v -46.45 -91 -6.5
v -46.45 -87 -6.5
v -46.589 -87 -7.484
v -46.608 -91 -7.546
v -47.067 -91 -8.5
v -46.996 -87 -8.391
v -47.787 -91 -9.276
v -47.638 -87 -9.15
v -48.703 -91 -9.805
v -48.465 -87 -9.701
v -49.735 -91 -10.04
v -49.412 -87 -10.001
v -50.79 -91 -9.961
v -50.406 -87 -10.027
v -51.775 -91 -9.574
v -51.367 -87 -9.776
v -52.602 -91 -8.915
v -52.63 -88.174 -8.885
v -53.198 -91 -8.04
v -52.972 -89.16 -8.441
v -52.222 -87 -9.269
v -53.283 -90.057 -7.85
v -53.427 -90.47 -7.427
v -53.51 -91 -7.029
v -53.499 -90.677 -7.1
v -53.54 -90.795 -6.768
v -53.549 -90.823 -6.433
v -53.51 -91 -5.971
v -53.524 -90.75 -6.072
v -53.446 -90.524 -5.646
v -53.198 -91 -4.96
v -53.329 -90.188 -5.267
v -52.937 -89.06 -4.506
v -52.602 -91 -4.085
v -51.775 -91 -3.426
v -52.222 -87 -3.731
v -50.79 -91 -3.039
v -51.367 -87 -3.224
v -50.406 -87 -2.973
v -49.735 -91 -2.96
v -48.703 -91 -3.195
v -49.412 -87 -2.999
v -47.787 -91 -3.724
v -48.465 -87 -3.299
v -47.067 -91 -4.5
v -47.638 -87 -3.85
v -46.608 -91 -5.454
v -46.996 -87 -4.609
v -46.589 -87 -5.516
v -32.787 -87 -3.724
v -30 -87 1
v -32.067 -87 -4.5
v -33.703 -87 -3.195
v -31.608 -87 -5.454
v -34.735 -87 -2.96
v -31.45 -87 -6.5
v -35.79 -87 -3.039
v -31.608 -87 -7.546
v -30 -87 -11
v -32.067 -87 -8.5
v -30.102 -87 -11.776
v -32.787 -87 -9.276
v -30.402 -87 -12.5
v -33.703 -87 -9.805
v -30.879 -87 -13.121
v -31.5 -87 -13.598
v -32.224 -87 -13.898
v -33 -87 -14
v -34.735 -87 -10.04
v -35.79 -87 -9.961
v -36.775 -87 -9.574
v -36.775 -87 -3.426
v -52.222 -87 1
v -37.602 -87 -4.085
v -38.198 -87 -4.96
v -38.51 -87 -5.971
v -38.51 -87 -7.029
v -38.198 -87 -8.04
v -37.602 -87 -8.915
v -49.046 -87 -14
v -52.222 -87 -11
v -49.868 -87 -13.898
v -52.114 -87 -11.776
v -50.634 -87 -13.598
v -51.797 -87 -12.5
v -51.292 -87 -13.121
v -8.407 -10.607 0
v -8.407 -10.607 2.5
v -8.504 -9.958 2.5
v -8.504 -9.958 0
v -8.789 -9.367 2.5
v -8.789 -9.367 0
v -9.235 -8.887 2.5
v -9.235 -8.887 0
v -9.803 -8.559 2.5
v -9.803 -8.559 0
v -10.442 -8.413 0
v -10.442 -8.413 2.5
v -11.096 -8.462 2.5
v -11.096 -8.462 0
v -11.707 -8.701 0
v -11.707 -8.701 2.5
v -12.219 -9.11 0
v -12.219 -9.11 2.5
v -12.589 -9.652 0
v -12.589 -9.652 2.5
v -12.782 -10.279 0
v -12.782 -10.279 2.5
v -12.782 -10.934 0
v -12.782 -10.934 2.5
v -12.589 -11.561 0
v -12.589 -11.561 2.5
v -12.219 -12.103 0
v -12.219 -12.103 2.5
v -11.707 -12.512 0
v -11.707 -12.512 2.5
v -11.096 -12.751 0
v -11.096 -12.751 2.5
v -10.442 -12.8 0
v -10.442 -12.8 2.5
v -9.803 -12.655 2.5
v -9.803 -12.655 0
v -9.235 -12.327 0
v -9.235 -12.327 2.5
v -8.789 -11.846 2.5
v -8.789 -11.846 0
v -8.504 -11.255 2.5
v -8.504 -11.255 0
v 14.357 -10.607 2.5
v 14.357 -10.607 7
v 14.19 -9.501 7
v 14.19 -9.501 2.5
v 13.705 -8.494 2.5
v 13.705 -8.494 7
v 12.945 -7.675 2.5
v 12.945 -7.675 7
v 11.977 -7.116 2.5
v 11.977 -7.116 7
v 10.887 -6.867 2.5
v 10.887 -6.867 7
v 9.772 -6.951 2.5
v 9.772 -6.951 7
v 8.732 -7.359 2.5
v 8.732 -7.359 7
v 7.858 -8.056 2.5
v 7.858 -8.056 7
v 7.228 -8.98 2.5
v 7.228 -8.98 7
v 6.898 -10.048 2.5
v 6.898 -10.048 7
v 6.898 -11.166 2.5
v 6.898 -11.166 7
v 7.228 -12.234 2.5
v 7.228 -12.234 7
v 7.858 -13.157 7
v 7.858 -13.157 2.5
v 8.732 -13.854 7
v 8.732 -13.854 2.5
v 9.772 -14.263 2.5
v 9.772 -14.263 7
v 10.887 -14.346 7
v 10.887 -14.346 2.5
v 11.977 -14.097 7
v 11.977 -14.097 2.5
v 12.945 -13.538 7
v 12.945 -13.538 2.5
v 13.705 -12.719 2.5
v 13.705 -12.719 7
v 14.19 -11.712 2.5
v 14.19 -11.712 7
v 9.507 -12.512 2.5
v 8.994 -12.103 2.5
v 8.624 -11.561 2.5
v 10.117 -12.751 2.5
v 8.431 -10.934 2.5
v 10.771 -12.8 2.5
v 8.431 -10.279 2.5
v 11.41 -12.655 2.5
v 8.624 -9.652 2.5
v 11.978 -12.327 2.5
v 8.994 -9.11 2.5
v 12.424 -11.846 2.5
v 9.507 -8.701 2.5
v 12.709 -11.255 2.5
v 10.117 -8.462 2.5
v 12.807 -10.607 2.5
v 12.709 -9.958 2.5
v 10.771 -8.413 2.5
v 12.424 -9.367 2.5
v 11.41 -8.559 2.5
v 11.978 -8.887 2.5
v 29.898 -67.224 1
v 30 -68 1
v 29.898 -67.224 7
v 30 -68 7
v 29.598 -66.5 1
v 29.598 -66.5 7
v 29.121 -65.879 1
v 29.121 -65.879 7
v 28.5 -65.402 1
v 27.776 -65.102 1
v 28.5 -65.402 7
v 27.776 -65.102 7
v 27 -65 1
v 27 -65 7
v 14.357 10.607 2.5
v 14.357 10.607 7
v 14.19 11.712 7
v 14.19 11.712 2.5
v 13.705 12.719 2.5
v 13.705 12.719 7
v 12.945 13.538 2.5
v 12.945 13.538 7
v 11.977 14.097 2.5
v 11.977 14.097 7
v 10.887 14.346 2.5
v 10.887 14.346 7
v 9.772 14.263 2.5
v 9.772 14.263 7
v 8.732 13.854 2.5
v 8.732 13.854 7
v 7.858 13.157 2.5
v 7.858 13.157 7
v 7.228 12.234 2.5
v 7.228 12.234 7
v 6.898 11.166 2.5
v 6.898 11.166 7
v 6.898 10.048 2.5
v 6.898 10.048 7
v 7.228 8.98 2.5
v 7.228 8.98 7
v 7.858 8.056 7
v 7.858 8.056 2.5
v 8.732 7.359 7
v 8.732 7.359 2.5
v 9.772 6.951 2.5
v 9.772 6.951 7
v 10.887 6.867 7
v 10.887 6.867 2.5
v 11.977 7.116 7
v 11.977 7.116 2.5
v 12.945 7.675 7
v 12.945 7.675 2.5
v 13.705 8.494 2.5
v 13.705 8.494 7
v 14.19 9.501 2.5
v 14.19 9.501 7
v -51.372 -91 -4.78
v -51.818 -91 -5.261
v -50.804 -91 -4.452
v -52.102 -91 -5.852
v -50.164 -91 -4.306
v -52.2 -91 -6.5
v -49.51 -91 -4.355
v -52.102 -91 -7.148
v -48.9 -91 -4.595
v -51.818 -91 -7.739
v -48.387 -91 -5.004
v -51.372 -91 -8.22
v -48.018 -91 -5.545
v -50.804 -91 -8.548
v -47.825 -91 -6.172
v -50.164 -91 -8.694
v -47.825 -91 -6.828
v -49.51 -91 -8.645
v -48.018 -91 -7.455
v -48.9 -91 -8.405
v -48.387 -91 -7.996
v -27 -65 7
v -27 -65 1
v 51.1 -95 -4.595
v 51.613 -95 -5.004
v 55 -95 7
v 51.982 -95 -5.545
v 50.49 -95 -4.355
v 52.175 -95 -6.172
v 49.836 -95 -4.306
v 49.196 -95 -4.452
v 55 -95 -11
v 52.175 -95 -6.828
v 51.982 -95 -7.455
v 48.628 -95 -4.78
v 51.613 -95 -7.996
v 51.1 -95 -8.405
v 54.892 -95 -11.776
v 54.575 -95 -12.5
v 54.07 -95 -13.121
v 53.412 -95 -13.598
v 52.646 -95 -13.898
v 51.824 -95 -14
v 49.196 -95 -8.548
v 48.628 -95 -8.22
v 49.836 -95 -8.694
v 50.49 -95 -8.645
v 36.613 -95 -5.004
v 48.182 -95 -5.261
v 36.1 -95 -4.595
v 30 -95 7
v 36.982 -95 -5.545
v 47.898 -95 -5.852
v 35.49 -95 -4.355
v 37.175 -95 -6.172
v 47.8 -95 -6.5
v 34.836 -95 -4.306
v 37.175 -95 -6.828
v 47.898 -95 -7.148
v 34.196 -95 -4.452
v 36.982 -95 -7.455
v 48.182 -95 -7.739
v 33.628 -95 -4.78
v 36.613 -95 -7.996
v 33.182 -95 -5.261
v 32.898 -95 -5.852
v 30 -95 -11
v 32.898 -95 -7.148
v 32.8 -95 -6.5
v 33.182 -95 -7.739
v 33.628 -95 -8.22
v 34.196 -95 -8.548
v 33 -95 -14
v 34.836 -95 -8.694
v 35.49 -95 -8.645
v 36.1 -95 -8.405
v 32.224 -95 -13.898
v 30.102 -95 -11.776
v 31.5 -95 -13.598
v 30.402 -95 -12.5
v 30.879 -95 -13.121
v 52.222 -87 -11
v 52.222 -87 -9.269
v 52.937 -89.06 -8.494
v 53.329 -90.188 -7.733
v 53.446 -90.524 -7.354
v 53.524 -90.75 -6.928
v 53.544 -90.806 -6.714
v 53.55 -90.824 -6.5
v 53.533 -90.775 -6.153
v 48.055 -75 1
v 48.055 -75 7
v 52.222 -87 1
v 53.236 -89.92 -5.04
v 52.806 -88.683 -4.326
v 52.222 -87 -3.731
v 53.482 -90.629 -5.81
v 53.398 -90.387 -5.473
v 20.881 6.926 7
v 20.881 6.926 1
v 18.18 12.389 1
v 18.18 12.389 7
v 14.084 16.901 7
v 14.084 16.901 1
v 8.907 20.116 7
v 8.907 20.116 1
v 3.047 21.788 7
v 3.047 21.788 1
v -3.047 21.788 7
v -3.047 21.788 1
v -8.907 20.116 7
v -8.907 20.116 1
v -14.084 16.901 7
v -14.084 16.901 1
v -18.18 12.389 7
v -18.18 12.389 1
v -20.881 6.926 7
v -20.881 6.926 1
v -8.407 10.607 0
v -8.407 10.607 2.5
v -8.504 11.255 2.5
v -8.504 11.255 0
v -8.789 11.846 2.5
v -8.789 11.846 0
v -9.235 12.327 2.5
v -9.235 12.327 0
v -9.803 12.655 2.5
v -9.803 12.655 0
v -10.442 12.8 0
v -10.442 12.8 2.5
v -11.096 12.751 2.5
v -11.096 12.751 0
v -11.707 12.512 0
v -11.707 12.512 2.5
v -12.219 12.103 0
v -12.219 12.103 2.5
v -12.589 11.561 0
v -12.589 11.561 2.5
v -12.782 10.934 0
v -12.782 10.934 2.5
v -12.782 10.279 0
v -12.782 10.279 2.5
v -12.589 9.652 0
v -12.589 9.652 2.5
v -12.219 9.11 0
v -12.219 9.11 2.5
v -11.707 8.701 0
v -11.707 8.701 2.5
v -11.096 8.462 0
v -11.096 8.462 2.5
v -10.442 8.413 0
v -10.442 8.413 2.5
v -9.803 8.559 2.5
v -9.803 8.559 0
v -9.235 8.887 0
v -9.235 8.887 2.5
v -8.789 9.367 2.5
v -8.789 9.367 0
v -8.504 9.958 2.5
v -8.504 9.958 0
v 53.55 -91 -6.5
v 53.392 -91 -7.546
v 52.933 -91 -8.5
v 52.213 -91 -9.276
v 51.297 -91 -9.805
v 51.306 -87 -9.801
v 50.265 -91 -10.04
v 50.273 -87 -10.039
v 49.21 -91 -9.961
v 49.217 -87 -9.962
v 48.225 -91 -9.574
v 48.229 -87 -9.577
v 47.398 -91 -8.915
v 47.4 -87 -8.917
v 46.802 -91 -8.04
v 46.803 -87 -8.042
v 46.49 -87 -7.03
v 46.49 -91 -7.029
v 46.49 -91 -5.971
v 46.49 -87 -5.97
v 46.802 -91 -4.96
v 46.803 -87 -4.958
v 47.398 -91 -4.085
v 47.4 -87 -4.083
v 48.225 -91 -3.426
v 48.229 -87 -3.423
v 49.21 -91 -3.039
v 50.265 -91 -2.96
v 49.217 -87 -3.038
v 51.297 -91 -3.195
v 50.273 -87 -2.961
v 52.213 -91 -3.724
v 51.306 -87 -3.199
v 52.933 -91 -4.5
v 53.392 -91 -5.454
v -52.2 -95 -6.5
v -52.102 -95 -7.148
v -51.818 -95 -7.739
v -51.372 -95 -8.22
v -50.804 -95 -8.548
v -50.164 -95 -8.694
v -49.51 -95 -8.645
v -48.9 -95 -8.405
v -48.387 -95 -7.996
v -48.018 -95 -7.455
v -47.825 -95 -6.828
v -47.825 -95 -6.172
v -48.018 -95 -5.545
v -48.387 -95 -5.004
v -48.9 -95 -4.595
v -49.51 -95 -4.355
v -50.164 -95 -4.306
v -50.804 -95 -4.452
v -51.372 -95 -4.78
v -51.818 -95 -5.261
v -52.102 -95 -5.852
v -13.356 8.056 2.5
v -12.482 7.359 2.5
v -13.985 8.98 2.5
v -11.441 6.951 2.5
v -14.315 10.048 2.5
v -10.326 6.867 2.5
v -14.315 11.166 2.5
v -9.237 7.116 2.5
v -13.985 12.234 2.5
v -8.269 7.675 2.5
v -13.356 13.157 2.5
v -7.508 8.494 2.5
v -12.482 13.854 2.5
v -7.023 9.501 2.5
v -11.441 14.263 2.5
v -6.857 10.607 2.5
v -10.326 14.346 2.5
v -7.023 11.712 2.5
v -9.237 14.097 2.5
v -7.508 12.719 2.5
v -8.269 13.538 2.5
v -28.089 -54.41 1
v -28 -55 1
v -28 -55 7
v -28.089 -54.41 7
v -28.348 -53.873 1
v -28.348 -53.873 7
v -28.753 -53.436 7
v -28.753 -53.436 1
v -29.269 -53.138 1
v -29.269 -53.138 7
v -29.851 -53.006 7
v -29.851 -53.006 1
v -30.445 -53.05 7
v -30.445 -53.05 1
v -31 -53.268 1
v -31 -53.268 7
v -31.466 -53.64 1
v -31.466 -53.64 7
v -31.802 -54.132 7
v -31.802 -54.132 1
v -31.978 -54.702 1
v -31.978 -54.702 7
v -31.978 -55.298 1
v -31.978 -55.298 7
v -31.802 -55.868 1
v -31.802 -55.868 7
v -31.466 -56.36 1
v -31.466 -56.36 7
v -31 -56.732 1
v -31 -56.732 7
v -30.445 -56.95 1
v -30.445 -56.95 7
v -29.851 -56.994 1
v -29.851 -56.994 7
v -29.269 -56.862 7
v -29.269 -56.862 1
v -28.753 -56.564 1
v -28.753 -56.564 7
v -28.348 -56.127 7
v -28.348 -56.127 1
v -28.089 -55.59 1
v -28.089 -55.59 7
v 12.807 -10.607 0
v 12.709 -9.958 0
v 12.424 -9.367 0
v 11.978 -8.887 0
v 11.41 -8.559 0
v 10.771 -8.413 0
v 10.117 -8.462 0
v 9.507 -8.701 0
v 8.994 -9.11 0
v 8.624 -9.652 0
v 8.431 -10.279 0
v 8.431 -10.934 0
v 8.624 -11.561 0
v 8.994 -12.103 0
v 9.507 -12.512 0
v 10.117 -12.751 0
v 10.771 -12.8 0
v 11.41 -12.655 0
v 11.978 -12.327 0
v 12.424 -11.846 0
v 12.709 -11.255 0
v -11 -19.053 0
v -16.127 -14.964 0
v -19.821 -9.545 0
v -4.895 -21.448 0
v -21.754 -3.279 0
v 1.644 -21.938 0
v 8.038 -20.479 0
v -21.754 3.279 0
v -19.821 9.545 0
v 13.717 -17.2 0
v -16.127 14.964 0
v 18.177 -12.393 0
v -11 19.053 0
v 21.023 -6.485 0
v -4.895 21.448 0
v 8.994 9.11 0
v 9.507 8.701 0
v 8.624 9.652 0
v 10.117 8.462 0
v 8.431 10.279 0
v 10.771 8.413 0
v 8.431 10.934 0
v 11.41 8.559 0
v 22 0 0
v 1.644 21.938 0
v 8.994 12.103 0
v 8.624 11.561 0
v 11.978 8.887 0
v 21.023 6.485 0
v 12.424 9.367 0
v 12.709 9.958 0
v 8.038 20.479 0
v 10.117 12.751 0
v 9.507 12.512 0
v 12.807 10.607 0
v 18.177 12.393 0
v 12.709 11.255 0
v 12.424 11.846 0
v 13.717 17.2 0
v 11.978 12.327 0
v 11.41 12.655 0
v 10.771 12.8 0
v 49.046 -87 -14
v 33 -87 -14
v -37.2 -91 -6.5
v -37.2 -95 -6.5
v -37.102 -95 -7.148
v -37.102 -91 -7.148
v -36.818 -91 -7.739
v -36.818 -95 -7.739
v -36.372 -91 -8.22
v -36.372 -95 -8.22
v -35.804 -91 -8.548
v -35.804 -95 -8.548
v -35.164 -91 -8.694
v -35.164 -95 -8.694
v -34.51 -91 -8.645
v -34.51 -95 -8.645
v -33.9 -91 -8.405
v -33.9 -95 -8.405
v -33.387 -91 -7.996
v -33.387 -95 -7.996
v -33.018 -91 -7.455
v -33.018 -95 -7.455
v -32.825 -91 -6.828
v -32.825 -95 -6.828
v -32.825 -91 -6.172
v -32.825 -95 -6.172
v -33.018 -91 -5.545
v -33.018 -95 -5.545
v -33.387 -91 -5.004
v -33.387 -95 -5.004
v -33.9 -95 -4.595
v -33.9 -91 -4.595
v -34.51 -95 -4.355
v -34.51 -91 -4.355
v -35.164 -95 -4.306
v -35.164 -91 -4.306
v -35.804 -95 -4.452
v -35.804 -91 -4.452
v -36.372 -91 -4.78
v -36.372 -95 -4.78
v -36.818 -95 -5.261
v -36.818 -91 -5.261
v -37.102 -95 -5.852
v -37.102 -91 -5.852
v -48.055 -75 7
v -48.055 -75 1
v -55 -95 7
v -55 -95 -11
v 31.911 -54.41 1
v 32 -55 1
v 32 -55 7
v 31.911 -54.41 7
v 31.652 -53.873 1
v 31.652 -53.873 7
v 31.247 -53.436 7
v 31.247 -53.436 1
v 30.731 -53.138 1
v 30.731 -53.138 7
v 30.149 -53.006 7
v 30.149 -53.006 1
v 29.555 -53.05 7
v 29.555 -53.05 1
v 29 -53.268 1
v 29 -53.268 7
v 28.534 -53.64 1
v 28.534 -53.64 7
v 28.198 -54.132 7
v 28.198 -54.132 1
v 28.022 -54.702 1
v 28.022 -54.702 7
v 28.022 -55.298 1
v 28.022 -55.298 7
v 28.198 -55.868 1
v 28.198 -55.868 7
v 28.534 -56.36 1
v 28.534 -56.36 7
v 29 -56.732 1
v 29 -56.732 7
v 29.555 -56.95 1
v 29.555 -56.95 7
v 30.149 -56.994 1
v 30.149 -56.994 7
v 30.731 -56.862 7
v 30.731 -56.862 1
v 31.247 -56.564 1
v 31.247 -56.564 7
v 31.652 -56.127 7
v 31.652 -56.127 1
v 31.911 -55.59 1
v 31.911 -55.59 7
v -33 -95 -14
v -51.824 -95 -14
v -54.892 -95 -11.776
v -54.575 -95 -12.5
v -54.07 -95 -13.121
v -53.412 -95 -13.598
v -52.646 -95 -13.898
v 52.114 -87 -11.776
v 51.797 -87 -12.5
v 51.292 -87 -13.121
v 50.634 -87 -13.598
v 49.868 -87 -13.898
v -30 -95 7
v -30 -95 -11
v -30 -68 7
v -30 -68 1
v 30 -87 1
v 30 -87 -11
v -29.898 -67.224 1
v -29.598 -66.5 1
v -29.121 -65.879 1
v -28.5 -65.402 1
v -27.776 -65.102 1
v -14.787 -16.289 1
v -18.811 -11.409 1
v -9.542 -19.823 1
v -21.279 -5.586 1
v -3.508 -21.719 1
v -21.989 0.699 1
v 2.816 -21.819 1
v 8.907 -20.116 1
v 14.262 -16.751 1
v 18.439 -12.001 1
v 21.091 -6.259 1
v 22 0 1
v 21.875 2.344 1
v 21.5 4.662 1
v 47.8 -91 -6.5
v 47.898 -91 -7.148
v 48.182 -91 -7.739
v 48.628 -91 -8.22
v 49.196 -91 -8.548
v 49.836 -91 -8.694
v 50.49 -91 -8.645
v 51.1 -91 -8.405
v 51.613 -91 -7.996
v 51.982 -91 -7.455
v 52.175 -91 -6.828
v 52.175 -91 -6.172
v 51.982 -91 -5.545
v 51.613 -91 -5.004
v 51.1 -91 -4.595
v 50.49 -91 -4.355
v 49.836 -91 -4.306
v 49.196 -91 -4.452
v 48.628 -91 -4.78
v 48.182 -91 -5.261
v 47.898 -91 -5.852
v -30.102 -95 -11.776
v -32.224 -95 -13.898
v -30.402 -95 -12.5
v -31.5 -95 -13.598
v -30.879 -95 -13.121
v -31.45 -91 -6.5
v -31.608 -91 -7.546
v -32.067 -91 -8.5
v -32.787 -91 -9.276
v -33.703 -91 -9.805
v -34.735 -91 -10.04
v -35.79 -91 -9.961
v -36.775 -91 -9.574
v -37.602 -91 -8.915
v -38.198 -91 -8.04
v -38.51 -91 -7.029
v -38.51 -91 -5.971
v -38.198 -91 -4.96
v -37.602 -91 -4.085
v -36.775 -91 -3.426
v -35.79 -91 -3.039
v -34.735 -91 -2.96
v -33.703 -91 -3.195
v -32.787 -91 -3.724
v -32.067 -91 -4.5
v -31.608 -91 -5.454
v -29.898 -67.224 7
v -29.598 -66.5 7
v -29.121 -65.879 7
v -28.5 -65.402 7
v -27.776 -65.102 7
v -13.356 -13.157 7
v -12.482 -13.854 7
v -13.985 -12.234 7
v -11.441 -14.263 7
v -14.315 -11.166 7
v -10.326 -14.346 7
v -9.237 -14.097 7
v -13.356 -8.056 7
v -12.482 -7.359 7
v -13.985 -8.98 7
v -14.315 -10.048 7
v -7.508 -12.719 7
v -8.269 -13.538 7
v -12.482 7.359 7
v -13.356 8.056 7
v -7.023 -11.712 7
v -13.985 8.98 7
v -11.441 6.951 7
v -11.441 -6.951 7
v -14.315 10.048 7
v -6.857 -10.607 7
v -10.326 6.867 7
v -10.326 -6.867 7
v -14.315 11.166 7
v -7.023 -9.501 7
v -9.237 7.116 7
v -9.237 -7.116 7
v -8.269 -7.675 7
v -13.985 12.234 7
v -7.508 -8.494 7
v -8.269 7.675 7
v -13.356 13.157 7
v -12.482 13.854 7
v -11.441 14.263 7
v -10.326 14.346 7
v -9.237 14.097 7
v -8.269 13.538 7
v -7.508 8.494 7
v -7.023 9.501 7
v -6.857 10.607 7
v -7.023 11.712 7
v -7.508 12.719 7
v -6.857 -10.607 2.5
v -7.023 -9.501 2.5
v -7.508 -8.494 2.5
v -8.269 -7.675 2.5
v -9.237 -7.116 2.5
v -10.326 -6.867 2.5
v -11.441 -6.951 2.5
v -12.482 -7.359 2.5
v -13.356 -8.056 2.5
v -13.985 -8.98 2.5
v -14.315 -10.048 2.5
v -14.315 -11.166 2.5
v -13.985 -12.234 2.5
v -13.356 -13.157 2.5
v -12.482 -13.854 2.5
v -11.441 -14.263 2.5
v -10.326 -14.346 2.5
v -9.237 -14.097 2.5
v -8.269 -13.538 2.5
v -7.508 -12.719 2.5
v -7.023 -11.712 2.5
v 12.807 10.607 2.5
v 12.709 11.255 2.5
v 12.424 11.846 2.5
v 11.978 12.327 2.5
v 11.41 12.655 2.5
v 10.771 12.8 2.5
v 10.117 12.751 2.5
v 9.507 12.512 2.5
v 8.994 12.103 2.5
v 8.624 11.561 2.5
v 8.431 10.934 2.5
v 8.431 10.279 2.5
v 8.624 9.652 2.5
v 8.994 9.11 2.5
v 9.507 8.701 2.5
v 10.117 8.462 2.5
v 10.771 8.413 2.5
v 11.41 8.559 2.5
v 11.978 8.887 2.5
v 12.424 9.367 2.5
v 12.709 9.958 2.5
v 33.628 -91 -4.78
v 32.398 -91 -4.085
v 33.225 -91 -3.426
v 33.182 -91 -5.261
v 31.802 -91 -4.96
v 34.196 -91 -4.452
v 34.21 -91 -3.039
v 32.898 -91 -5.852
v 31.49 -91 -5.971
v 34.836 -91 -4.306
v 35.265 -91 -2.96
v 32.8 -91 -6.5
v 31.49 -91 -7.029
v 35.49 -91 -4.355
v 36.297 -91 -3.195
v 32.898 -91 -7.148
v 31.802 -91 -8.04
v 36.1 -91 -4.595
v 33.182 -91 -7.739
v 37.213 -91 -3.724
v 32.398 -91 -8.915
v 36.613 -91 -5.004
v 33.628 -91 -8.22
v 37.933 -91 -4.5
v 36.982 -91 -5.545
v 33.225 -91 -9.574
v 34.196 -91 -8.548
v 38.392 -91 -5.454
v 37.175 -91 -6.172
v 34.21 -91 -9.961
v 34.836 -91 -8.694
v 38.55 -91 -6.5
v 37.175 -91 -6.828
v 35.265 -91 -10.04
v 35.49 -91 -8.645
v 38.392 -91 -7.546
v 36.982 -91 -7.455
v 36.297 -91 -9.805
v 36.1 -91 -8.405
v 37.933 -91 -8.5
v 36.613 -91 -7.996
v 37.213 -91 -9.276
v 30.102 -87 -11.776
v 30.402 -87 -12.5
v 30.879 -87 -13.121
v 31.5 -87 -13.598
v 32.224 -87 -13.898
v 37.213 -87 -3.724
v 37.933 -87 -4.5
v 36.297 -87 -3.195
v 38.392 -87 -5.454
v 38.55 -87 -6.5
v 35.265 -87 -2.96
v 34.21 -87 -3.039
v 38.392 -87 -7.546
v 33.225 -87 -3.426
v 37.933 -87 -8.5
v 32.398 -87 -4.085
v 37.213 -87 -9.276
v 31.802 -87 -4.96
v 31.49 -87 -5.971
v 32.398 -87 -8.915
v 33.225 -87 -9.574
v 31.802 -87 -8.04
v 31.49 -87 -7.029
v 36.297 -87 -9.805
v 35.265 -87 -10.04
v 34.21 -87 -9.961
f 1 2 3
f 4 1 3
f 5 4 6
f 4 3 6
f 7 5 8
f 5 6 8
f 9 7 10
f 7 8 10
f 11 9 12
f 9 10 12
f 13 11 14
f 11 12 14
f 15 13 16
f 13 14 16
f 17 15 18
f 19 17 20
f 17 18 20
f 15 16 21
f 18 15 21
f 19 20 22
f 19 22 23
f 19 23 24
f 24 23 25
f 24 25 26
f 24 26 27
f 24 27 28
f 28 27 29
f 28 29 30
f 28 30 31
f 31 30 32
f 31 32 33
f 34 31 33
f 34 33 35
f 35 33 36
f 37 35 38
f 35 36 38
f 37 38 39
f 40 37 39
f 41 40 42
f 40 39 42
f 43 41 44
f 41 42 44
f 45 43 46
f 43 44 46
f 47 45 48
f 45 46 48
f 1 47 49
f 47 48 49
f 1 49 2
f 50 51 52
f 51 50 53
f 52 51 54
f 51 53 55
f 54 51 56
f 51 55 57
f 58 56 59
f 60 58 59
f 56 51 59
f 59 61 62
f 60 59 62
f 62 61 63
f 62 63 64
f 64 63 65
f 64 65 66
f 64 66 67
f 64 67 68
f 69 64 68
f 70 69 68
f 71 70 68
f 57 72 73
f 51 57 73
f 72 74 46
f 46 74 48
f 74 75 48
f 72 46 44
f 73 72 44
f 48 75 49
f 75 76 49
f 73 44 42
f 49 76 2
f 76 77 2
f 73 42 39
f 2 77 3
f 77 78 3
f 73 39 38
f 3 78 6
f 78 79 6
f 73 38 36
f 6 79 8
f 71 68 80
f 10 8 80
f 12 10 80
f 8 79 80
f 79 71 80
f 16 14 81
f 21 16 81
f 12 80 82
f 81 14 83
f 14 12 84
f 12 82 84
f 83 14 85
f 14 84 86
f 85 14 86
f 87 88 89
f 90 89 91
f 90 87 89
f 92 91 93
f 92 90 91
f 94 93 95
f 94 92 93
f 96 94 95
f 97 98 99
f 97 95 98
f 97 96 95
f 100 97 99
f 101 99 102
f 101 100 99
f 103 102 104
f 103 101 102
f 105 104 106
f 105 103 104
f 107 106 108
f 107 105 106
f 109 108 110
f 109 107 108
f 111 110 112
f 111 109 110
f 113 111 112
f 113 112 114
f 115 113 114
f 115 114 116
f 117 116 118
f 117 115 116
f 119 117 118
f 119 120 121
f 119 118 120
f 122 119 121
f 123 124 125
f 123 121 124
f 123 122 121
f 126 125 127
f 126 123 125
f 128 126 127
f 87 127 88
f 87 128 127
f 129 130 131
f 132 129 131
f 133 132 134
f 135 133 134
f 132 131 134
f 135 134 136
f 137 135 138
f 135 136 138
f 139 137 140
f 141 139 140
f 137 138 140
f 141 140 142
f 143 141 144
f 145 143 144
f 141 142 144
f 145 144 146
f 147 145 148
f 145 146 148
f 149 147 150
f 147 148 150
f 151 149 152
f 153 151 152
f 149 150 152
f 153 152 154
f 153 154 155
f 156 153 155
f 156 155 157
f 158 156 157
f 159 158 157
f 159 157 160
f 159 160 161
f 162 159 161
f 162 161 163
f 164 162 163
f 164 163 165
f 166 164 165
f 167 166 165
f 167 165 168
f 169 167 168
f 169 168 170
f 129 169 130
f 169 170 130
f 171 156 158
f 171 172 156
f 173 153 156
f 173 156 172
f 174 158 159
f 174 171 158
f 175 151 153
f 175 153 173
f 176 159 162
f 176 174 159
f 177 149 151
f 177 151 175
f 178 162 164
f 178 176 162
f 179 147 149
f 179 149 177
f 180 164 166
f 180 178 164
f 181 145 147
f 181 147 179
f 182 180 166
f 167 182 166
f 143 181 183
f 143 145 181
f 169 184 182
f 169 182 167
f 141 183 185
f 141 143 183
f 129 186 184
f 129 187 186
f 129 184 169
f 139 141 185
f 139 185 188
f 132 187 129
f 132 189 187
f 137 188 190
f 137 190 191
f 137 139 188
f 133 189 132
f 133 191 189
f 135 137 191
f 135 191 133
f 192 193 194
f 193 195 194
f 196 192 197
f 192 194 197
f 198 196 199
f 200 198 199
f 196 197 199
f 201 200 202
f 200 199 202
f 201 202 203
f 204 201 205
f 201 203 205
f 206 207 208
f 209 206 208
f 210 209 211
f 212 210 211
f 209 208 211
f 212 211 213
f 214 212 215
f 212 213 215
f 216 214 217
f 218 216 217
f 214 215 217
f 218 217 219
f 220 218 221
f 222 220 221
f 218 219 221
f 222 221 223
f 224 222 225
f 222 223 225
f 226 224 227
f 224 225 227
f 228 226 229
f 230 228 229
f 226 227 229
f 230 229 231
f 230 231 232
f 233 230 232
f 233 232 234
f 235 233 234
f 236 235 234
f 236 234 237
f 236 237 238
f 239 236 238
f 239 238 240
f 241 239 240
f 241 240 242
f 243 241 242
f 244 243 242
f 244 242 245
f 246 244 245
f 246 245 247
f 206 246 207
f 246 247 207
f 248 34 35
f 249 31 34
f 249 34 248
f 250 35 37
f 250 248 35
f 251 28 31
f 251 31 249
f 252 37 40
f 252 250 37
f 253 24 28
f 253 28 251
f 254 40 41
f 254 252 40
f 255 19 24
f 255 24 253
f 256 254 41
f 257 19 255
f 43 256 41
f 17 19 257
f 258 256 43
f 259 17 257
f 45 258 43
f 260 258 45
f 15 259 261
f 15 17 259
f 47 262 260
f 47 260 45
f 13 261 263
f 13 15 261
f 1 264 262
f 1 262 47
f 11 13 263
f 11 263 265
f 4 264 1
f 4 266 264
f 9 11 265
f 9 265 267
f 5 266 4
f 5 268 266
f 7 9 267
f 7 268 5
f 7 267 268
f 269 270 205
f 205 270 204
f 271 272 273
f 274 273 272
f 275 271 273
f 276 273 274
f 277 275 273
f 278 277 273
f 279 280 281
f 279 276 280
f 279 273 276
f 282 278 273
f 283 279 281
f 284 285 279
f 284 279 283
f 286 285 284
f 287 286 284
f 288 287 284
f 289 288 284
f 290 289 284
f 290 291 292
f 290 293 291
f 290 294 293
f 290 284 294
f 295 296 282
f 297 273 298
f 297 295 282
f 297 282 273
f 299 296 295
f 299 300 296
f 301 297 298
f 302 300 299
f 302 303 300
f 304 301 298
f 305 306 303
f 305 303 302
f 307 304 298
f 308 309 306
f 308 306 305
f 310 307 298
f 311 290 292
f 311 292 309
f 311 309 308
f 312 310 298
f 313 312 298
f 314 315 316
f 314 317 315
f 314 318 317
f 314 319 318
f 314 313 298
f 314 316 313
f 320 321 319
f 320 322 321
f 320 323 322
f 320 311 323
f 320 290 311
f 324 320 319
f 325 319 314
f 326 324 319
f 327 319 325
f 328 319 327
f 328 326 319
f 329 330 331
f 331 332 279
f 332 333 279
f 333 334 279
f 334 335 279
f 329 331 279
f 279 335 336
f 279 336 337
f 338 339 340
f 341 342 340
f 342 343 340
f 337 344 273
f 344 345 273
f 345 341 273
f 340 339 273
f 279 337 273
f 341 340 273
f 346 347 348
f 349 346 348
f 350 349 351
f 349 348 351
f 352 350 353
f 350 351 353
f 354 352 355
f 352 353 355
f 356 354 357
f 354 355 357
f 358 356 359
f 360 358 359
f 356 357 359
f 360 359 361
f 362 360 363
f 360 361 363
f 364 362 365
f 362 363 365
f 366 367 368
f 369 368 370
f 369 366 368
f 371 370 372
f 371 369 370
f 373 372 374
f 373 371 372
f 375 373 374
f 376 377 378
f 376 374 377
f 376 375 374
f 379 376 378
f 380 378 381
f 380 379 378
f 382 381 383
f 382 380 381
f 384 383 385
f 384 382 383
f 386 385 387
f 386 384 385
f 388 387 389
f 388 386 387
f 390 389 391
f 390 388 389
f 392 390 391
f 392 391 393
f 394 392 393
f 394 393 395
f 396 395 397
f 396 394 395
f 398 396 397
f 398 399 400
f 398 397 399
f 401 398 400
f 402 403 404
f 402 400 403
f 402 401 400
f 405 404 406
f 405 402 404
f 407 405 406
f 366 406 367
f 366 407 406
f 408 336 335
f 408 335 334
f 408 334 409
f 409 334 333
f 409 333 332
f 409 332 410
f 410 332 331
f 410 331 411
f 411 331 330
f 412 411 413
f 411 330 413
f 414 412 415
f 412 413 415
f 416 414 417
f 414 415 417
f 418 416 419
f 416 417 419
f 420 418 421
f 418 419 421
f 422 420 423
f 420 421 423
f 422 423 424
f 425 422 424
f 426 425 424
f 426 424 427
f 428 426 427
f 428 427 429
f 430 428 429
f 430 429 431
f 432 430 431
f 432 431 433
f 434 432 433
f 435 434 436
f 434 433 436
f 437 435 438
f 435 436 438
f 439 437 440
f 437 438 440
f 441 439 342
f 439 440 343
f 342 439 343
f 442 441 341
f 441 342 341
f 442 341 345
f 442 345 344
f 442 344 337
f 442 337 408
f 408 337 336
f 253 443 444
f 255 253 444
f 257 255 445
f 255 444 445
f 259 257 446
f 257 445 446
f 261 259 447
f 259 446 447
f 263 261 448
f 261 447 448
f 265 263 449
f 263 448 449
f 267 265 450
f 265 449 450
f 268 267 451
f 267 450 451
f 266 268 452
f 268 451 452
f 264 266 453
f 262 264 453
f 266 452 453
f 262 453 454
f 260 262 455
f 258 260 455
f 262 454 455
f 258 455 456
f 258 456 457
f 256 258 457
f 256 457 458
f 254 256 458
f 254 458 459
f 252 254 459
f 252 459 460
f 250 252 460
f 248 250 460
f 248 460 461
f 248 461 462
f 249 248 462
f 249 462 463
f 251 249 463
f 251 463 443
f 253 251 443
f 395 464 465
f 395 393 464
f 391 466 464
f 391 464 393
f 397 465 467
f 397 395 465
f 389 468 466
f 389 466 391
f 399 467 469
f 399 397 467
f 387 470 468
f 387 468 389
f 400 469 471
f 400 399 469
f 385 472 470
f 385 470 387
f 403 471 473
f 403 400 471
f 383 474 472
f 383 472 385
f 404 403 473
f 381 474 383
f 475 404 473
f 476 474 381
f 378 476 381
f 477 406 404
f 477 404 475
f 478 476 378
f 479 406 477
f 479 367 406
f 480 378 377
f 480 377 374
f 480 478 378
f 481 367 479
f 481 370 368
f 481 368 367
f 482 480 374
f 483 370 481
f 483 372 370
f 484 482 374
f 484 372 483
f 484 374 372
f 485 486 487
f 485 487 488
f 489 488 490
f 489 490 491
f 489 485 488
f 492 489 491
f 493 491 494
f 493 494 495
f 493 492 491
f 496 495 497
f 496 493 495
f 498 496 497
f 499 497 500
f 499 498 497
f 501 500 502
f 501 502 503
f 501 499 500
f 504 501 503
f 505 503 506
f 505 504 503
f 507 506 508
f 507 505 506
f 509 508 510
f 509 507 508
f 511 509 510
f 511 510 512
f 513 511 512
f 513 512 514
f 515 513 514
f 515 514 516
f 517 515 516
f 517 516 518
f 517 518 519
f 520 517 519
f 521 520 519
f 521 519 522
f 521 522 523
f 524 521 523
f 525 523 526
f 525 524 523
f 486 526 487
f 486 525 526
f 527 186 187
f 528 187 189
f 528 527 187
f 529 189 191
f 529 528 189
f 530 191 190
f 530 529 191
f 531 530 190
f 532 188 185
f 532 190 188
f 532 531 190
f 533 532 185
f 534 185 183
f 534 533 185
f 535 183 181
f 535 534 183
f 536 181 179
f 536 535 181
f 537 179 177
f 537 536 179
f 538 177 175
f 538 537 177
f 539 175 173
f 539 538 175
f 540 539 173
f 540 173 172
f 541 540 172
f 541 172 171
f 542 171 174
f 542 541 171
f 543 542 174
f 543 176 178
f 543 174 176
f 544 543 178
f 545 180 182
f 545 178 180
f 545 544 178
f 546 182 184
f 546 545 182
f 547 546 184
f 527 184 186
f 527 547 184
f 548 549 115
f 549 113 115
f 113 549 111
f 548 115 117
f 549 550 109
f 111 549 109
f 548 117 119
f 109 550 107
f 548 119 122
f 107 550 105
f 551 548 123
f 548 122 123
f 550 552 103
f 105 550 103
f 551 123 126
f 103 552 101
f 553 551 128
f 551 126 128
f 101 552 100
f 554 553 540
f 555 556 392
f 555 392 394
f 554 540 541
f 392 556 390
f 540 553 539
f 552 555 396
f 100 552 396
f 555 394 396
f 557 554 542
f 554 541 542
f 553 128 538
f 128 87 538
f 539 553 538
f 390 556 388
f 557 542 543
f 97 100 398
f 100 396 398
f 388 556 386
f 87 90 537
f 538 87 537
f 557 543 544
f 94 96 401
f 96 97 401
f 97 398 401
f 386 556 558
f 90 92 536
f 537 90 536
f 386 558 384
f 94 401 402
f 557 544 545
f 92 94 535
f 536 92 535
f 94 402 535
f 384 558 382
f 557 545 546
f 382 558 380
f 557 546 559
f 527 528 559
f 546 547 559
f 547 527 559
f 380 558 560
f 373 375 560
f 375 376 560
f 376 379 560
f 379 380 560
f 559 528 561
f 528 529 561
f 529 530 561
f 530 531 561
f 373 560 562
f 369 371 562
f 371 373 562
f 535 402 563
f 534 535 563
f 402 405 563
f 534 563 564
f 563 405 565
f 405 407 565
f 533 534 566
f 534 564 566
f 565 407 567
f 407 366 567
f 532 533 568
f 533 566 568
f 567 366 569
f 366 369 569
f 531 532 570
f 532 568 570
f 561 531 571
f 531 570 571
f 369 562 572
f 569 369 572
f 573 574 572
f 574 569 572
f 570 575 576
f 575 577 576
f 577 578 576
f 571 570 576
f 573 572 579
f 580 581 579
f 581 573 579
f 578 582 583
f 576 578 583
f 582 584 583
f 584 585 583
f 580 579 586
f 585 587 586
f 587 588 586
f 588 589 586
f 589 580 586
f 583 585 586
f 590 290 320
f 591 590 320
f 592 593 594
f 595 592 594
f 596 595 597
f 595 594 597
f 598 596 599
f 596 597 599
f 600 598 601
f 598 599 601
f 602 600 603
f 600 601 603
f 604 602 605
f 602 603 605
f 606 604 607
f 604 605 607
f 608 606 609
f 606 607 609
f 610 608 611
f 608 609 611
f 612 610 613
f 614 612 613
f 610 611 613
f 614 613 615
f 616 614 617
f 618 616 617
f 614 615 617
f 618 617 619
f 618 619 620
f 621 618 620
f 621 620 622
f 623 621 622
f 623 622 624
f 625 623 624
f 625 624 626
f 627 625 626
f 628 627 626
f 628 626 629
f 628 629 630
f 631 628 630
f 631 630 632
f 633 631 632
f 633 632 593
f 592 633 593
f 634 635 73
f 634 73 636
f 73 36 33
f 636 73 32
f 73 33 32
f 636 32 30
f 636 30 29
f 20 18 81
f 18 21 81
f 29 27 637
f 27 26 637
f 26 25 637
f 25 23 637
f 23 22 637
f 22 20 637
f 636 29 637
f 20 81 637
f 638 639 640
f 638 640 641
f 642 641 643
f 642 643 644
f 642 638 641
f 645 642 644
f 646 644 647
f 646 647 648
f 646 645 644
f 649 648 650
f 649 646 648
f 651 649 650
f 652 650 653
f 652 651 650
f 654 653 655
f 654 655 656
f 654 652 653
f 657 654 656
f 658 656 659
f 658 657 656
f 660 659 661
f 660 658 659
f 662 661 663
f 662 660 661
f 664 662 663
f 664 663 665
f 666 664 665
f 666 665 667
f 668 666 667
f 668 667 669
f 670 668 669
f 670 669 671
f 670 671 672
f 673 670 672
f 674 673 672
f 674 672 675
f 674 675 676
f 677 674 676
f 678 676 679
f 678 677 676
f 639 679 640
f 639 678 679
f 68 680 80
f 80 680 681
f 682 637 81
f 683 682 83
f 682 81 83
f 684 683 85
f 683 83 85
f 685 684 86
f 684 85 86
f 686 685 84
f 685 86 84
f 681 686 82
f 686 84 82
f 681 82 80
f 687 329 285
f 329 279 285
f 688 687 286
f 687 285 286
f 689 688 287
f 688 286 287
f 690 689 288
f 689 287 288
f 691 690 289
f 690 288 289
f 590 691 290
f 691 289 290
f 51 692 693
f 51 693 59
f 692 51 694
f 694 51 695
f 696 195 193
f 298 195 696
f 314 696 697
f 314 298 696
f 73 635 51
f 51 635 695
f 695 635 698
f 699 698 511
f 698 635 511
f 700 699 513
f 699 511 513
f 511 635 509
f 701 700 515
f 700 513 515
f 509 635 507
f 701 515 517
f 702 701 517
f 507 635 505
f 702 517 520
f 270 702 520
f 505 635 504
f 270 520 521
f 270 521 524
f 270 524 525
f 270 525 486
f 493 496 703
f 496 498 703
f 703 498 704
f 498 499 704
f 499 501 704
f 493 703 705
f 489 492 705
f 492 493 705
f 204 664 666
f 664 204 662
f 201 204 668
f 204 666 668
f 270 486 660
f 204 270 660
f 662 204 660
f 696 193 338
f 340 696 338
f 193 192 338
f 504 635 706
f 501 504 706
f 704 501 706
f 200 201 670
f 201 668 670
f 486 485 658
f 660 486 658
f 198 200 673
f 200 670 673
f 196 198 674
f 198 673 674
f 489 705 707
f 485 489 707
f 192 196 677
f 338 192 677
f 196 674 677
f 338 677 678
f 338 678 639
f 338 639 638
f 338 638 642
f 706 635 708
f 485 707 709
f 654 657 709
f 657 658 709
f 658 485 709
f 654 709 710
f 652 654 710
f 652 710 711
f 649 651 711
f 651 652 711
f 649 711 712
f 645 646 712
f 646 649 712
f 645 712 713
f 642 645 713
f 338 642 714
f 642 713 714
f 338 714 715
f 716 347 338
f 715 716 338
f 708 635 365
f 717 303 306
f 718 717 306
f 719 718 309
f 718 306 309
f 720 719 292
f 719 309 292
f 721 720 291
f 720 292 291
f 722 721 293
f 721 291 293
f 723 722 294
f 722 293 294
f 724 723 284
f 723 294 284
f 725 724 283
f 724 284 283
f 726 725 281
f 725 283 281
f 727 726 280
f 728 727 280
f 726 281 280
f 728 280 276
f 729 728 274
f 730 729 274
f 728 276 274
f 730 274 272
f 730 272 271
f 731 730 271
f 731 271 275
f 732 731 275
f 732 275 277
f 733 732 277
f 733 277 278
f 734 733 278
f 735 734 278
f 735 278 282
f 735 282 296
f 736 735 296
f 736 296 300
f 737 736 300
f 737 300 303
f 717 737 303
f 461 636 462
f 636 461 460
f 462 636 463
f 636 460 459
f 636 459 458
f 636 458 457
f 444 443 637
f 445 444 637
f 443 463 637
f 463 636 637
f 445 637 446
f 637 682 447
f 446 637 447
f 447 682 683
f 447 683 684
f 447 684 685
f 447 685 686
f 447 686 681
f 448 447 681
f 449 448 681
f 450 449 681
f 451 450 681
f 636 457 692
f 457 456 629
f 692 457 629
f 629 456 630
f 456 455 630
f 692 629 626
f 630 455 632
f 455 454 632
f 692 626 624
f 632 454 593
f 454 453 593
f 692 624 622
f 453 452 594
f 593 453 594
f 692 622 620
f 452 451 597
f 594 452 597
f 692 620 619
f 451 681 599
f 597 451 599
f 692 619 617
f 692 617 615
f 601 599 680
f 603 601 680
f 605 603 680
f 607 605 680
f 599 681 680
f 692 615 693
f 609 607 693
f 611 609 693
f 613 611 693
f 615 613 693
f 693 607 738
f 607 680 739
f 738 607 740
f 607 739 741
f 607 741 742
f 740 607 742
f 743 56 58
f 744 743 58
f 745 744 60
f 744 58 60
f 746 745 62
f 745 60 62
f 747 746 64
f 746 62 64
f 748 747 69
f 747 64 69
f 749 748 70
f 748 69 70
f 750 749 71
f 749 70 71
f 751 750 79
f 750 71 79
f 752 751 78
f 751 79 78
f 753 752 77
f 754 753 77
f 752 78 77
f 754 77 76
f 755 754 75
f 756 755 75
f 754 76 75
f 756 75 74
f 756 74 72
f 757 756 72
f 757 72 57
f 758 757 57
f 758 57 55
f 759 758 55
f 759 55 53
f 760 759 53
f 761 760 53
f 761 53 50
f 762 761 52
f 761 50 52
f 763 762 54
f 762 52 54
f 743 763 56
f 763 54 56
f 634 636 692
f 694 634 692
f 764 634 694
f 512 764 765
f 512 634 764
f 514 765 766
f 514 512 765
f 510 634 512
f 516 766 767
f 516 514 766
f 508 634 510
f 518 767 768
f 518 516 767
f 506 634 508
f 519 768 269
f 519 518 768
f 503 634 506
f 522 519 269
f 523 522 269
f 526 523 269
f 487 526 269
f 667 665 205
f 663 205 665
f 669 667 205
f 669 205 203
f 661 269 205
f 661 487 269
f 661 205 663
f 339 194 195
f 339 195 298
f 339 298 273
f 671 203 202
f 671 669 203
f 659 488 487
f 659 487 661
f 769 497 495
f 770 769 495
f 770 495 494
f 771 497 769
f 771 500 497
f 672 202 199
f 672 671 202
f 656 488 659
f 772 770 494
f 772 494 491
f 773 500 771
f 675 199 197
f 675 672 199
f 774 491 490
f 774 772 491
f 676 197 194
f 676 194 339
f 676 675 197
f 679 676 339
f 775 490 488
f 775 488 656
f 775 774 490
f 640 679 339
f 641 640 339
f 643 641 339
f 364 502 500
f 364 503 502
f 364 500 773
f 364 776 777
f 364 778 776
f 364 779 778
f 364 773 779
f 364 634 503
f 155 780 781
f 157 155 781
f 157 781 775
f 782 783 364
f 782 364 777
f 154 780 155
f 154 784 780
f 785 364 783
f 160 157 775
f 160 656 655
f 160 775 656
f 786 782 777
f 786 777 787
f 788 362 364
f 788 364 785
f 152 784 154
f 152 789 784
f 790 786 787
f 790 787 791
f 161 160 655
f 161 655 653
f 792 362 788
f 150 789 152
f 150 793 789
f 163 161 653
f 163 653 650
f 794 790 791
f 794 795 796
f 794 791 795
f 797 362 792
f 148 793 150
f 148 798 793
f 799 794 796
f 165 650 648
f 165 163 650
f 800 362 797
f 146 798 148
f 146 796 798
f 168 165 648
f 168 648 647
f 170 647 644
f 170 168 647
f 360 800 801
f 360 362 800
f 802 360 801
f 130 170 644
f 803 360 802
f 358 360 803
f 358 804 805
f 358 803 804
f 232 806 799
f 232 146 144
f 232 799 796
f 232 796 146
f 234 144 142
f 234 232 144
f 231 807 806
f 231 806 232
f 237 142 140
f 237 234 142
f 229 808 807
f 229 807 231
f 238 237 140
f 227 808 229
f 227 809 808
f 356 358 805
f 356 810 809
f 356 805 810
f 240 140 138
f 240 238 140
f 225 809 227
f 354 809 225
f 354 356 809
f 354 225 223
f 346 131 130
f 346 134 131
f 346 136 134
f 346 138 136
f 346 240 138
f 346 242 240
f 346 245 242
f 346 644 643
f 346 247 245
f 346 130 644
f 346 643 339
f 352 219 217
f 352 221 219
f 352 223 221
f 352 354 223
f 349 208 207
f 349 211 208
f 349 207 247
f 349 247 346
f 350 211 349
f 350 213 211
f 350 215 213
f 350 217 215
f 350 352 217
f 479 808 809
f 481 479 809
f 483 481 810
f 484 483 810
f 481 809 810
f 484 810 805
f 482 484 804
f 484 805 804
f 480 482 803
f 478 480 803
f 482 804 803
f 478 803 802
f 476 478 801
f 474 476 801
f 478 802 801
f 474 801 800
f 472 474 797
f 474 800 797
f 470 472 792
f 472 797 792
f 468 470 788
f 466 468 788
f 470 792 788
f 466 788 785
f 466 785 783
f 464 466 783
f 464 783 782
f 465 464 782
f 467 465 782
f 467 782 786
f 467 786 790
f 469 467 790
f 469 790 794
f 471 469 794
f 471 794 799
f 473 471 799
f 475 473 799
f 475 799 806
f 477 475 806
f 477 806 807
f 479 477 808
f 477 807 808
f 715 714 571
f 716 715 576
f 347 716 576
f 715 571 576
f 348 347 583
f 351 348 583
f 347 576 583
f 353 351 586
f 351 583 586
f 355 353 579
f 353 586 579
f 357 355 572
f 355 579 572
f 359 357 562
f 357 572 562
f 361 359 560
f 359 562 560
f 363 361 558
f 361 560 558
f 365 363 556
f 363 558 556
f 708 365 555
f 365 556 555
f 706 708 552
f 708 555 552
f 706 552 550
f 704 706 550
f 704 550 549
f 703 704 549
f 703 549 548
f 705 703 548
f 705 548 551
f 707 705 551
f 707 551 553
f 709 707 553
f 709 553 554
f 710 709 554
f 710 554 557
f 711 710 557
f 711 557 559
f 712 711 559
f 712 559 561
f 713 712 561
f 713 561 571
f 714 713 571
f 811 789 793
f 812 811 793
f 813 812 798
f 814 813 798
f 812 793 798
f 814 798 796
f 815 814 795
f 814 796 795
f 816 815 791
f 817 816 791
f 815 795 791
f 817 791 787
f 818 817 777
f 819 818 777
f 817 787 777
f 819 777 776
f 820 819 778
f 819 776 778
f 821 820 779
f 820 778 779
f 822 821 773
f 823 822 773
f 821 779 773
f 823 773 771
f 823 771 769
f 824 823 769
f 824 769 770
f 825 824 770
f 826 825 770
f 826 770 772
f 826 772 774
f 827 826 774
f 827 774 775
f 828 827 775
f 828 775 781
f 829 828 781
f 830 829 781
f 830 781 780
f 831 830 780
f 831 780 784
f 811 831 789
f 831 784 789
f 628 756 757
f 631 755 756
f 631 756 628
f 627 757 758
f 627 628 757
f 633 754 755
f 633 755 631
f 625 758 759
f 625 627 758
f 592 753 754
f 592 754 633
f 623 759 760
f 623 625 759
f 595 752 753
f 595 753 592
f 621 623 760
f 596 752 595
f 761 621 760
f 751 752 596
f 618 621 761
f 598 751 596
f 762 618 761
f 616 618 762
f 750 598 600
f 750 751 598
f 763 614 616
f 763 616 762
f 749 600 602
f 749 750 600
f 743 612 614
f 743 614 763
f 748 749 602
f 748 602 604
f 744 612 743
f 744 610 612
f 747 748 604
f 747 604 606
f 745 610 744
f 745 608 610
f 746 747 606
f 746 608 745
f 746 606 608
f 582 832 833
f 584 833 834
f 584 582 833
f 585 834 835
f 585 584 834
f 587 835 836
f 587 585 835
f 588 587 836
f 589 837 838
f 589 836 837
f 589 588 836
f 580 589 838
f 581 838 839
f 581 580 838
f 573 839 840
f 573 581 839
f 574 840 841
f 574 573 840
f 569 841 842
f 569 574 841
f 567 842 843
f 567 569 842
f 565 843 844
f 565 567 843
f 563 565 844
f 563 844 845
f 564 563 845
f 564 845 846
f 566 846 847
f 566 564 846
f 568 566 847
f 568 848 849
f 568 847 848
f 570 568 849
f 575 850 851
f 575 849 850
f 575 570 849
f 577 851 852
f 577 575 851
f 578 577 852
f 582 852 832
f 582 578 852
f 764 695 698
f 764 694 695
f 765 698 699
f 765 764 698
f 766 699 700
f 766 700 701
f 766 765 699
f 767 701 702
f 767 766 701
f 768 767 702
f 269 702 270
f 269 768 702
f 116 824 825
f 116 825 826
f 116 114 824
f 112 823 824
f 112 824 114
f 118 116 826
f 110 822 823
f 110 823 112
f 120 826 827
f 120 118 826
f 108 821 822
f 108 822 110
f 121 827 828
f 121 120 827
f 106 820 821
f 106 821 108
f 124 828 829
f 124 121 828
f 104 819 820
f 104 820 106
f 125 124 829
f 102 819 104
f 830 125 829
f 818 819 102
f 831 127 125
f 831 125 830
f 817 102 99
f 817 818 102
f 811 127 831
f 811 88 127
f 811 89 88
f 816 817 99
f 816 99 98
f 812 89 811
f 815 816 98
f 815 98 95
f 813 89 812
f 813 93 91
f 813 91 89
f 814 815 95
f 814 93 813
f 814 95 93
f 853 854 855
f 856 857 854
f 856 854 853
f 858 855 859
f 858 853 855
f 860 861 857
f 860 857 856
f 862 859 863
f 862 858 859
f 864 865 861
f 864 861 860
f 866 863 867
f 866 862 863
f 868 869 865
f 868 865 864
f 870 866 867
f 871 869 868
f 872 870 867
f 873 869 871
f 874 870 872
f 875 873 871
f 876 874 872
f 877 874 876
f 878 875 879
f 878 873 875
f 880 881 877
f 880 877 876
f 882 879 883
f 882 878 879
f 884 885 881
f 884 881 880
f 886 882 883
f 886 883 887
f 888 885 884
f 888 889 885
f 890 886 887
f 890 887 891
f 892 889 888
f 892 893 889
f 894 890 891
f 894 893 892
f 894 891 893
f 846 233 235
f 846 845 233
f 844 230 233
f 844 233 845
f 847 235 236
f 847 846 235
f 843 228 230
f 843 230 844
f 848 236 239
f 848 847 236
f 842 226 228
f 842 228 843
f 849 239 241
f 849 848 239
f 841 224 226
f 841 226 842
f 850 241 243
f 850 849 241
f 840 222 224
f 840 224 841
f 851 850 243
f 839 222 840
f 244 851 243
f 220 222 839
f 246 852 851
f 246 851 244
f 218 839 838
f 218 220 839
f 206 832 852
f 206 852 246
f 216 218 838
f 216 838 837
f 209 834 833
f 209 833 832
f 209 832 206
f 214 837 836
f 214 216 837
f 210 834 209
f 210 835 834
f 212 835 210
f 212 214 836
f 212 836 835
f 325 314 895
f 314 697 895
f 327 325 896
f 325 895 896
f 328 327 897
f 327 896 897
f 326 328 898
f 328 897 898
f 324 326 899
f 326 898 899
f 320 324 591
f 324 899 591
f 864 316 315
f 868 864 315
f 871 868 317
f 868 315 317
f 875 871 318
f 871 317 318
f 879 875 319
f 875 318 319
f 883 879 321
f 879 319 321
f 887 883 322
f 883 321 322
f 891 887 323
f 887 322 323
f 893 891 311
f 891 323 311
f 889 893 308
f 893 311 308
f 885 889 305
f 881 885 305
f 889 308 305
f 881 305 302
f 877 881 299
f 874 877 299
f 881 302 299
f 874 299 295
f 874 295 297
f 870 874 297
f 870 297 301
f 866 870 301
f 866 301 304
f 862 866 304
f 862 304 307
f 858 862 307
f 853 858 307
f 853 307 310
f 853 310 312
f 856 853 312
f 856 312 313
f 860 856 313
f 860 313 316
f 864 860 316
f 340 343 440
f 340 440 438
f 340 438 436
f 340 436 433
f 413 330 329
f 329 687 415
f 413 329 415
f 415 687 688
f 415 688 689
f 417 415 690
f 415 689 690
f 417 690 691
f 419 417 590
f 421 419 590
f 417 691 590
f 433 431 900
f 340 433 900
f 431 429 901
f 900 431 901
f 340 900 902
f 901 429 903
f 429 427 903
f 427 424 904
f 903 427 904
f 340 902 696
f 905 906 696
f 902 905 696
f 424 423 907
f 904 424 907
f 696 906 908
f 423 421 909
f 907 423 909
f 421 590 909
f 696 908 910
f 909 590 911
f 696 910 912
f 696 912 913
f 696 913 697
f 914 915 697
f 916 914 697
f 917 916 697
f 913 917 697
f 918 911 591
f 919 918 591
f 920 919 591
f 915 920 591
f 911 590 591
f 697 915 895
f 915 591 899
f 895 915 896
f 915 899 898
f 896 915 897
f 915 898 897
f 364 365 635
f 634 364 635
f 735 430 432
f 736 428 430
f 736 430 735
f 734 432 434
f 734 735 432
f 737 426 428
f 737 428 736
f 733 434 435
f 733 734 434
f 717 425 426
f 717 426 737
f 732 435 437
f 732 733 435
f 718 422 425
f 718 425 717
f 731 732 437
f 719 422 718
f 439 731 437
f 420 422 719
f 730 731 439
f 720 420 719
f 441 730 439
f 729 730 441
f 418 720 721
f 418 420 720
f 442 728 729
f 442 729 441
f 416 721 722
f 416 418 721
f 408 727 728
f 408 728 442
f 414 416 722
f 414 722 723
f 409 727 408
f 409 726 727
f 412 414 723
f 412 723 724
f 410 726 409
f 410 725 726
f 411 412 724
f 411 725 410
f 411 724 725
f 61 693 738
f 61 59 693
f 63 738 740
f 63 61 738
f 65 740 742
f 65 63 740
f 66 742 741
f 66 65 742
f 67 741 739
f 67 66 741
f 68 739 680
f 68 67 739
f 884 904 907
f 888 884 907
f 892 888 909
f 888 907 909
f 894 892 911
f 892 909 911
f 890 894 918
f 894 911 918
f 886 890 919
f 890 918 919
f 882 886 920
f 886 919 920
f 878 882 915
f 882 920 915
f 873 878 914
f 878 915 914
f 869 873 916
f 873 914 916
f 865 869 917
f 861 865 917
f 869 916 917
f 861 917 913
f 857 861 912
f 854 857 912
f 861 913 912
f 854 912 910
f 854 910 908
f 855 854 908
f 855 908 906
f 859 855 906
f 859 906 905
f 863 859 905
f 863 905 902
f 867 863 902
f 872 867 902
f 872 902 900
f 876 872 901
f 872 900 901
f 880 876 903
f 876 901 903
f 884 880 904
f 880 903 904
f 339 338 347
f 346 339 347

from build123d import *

# Parameters (mm, degrees)
SKETCH1_R           = 22
SKETCH1_R_2         = 2.2
BOSS_EXTRUDE1_DEPTH = 1
SKETCH2_R           = 2
SKETCH2_R_2         = 2.2
BOSS_EXTRUDE2_DEPTH = 6
SKETCH3_W           = 25
SKETCH3_H           = 15
SKETCH3_R           = 2.2
BOSS_EXTRUDE3_DEPTH = 8
CUT_EXTRUDE1_DEPTH  = 16
SKETCH5_R           = 3.55
CUT_EXTRUDE2_DEPTH  = 4
FILLET1_R           = 3
SKETCH6_R           = 3.75
CUT_EXTRUDE3_DEPTH  = 4.5


with BuildPart() as part:
    # Sketch1 → Boss-Extrude1 (new body)
    with BuildSketch(Plane.XY):
        Circle(SKETCH1_R)
        with Locations((10.606601718, 10.606601718)):
            Circle(SKETCH1_R_2, mode=Mode.SUBTRACT)
        with Locations((10.606601718, -10.606601718)):
            Circle(SKETCH1_R_2, mode=Mode.SUBTRACT)
        with Locations((-10.606601718, -10.606601718)):
            Circle(SKETCH1_R_2, mode=Mode.SUBTRACT)
        with Locations((-10.606601718, 10.606601718)):
            Circle(SKETCH1_R_2, mode=Mode.SUBTRACT)
    extrude(amount=BOSS_EXTRUDE1_DEPTH)

    # Sketch2 → Boss-Extrude2 (add)
    with BuildSketch(Plane.XY.offset(1)):
        with BuildLine():
            Line((-48.055, -75), (-55, -95))
            Line((-55, -95), (-30, -95))
            Line((-30, -95), (-30, -65))
            Line((-30, -65), (30, -65))
            Line((30, -65), (30, -95))
            Line((30, -95), (55, -95))
            Line((55, -95), (48.055, -75))
            Line((48.055, -75), (20.881333045, 6.926032793))
            ThreePointArc((20.881333045, 6.926032793), (0, 22), (-20.881333045, 6.926032793))
            Line((-20.881333045, 6.926032793), (-48.055, -75))
        make_face()
        with Locations((-30, -55)):
            Circle(SKETCH2_R, mode=Mode.SUBTRACT)
        with Locations((30, -55)):
            Circle(SKETCH2_R, mode=Mode.SUBTRACT)
        with Locations((-10.606601718, -10.606601718)):
            Circle(SKETCH2_R_2, mode=Mode.SUBTRACT)
        with Locations((-10.606601718, 10.606601718)):
            Circle(SKETCH2_R_2, mode=Mode.SUBTRACT)
        with Locations((10.606601718, -10.606601718)):
            Circle(SKETCH2_R_2, mode=Mode.SUBTRACT)
        with Locations((10.606601718, 10.606601718)):
            Circle(SKETCH2_R_2, mode=Mode.SUBTRACT)
    extrude(amount=BOSS_EXTRUDE2_DEPTH)

    # Sketch3 → Boss-Extrude3 (add)
    with BuildSketch(Plane(origin=(0, -95, 0), x_dir=(-1, 0, 0), z_dir=(0, -1, 0))):
        with Locations((-42.5, 6.5)):
            Rectangle(SKETCH3_W, SKETCH3_H)
        with Locations((-35, 6.5)):
            Circle(SKETCH3_R, mode=Mode.SUBTRACT)
        with Locations((-50, 6.5)):
            Circle(SKETCH3_R, mode=Mode.SUBTRACT)
        with Locations((42.5, 6.5)):
            Rectangle(SKETCH3_W, SKETCH3_H)
        with Locations((50, 6.5)):
            Circle(SKETCH3_R, mode=Mode.SUBTRACT)
        with Locations((35, 6.5)):
            Circle(SKETCH3_R, mode=Mode.SUBTRACT)
    extrude(amount=-BOSS_EXTRUDE3_DEPTH)

    # Sketch4 → Cut-Extrude1 (cut, through all)
    with BuildSketch(Plane.XY.offset(1)):
        Polygon((-55, -95), (-52.222, -87), (-55, -87), align=None)
        Polygon((55, -95), (55, -87), (52.222, -87), align=None)
    extrude(amount=-CUT_EXTRUDE1_DEPTH, mode=Mode.SUBTRACT)

    # Sketch5 → Cut-Extrude2 (cut)
    with BuildSketch(Plane(origin=(0, -87, 0), x_dir=(1, 0, 0), z_dir=(0, 1, 0))):
        with Locations((-50, 6.5)):
            Circle(SKETCH5_R)
        with Locations((-35, 6.5)):
            Circle(SKETCH5_R)
        with Locations((35, 6.5)):
            Circle(SKETCH5_R)
        with Locations((50, 6.5)):
            Circle(SKETCH5_R)
    extrude(amount=-CUT_EXTRUDE2_DEPTH, mode=Mode.SUBTRACT)

    # Fillet1
    fillet1_edges = [part.edges().sort_by_distance(p)[0] for p in [
        (-53.611, -91, -14),
        (53.611, -91, -14),
        (30, -65, 4),
        (-30, -65, 4),
        (30, -91, -14),
        (-30, -91, -14),
    ]]
    fillet(fillet1_edges, radius=FILLET1_R)

    # Sketch6 → Cut-Extrude3 (cut)
    with BuildSketch(Plane.XY.offset(7)):
        with Locations((-10.606601718, 10.606601718)):
            Circle(SKETCH6_R)
        with Locations((10.606601718, 10.606601718)):
            Circle(SKETCH6_R)
        with Locations((10.606601718, -10.606601718)):
            Circle(SKETCH6_R)
        with Locations((-10.606601718, -10.606601718)):
            Circle(SKETCH6_R)
    extrude(amount=-CUT_EXTRUDE3_DEPTH, mode=Mode.SUBTRACT)


solid = part.part
